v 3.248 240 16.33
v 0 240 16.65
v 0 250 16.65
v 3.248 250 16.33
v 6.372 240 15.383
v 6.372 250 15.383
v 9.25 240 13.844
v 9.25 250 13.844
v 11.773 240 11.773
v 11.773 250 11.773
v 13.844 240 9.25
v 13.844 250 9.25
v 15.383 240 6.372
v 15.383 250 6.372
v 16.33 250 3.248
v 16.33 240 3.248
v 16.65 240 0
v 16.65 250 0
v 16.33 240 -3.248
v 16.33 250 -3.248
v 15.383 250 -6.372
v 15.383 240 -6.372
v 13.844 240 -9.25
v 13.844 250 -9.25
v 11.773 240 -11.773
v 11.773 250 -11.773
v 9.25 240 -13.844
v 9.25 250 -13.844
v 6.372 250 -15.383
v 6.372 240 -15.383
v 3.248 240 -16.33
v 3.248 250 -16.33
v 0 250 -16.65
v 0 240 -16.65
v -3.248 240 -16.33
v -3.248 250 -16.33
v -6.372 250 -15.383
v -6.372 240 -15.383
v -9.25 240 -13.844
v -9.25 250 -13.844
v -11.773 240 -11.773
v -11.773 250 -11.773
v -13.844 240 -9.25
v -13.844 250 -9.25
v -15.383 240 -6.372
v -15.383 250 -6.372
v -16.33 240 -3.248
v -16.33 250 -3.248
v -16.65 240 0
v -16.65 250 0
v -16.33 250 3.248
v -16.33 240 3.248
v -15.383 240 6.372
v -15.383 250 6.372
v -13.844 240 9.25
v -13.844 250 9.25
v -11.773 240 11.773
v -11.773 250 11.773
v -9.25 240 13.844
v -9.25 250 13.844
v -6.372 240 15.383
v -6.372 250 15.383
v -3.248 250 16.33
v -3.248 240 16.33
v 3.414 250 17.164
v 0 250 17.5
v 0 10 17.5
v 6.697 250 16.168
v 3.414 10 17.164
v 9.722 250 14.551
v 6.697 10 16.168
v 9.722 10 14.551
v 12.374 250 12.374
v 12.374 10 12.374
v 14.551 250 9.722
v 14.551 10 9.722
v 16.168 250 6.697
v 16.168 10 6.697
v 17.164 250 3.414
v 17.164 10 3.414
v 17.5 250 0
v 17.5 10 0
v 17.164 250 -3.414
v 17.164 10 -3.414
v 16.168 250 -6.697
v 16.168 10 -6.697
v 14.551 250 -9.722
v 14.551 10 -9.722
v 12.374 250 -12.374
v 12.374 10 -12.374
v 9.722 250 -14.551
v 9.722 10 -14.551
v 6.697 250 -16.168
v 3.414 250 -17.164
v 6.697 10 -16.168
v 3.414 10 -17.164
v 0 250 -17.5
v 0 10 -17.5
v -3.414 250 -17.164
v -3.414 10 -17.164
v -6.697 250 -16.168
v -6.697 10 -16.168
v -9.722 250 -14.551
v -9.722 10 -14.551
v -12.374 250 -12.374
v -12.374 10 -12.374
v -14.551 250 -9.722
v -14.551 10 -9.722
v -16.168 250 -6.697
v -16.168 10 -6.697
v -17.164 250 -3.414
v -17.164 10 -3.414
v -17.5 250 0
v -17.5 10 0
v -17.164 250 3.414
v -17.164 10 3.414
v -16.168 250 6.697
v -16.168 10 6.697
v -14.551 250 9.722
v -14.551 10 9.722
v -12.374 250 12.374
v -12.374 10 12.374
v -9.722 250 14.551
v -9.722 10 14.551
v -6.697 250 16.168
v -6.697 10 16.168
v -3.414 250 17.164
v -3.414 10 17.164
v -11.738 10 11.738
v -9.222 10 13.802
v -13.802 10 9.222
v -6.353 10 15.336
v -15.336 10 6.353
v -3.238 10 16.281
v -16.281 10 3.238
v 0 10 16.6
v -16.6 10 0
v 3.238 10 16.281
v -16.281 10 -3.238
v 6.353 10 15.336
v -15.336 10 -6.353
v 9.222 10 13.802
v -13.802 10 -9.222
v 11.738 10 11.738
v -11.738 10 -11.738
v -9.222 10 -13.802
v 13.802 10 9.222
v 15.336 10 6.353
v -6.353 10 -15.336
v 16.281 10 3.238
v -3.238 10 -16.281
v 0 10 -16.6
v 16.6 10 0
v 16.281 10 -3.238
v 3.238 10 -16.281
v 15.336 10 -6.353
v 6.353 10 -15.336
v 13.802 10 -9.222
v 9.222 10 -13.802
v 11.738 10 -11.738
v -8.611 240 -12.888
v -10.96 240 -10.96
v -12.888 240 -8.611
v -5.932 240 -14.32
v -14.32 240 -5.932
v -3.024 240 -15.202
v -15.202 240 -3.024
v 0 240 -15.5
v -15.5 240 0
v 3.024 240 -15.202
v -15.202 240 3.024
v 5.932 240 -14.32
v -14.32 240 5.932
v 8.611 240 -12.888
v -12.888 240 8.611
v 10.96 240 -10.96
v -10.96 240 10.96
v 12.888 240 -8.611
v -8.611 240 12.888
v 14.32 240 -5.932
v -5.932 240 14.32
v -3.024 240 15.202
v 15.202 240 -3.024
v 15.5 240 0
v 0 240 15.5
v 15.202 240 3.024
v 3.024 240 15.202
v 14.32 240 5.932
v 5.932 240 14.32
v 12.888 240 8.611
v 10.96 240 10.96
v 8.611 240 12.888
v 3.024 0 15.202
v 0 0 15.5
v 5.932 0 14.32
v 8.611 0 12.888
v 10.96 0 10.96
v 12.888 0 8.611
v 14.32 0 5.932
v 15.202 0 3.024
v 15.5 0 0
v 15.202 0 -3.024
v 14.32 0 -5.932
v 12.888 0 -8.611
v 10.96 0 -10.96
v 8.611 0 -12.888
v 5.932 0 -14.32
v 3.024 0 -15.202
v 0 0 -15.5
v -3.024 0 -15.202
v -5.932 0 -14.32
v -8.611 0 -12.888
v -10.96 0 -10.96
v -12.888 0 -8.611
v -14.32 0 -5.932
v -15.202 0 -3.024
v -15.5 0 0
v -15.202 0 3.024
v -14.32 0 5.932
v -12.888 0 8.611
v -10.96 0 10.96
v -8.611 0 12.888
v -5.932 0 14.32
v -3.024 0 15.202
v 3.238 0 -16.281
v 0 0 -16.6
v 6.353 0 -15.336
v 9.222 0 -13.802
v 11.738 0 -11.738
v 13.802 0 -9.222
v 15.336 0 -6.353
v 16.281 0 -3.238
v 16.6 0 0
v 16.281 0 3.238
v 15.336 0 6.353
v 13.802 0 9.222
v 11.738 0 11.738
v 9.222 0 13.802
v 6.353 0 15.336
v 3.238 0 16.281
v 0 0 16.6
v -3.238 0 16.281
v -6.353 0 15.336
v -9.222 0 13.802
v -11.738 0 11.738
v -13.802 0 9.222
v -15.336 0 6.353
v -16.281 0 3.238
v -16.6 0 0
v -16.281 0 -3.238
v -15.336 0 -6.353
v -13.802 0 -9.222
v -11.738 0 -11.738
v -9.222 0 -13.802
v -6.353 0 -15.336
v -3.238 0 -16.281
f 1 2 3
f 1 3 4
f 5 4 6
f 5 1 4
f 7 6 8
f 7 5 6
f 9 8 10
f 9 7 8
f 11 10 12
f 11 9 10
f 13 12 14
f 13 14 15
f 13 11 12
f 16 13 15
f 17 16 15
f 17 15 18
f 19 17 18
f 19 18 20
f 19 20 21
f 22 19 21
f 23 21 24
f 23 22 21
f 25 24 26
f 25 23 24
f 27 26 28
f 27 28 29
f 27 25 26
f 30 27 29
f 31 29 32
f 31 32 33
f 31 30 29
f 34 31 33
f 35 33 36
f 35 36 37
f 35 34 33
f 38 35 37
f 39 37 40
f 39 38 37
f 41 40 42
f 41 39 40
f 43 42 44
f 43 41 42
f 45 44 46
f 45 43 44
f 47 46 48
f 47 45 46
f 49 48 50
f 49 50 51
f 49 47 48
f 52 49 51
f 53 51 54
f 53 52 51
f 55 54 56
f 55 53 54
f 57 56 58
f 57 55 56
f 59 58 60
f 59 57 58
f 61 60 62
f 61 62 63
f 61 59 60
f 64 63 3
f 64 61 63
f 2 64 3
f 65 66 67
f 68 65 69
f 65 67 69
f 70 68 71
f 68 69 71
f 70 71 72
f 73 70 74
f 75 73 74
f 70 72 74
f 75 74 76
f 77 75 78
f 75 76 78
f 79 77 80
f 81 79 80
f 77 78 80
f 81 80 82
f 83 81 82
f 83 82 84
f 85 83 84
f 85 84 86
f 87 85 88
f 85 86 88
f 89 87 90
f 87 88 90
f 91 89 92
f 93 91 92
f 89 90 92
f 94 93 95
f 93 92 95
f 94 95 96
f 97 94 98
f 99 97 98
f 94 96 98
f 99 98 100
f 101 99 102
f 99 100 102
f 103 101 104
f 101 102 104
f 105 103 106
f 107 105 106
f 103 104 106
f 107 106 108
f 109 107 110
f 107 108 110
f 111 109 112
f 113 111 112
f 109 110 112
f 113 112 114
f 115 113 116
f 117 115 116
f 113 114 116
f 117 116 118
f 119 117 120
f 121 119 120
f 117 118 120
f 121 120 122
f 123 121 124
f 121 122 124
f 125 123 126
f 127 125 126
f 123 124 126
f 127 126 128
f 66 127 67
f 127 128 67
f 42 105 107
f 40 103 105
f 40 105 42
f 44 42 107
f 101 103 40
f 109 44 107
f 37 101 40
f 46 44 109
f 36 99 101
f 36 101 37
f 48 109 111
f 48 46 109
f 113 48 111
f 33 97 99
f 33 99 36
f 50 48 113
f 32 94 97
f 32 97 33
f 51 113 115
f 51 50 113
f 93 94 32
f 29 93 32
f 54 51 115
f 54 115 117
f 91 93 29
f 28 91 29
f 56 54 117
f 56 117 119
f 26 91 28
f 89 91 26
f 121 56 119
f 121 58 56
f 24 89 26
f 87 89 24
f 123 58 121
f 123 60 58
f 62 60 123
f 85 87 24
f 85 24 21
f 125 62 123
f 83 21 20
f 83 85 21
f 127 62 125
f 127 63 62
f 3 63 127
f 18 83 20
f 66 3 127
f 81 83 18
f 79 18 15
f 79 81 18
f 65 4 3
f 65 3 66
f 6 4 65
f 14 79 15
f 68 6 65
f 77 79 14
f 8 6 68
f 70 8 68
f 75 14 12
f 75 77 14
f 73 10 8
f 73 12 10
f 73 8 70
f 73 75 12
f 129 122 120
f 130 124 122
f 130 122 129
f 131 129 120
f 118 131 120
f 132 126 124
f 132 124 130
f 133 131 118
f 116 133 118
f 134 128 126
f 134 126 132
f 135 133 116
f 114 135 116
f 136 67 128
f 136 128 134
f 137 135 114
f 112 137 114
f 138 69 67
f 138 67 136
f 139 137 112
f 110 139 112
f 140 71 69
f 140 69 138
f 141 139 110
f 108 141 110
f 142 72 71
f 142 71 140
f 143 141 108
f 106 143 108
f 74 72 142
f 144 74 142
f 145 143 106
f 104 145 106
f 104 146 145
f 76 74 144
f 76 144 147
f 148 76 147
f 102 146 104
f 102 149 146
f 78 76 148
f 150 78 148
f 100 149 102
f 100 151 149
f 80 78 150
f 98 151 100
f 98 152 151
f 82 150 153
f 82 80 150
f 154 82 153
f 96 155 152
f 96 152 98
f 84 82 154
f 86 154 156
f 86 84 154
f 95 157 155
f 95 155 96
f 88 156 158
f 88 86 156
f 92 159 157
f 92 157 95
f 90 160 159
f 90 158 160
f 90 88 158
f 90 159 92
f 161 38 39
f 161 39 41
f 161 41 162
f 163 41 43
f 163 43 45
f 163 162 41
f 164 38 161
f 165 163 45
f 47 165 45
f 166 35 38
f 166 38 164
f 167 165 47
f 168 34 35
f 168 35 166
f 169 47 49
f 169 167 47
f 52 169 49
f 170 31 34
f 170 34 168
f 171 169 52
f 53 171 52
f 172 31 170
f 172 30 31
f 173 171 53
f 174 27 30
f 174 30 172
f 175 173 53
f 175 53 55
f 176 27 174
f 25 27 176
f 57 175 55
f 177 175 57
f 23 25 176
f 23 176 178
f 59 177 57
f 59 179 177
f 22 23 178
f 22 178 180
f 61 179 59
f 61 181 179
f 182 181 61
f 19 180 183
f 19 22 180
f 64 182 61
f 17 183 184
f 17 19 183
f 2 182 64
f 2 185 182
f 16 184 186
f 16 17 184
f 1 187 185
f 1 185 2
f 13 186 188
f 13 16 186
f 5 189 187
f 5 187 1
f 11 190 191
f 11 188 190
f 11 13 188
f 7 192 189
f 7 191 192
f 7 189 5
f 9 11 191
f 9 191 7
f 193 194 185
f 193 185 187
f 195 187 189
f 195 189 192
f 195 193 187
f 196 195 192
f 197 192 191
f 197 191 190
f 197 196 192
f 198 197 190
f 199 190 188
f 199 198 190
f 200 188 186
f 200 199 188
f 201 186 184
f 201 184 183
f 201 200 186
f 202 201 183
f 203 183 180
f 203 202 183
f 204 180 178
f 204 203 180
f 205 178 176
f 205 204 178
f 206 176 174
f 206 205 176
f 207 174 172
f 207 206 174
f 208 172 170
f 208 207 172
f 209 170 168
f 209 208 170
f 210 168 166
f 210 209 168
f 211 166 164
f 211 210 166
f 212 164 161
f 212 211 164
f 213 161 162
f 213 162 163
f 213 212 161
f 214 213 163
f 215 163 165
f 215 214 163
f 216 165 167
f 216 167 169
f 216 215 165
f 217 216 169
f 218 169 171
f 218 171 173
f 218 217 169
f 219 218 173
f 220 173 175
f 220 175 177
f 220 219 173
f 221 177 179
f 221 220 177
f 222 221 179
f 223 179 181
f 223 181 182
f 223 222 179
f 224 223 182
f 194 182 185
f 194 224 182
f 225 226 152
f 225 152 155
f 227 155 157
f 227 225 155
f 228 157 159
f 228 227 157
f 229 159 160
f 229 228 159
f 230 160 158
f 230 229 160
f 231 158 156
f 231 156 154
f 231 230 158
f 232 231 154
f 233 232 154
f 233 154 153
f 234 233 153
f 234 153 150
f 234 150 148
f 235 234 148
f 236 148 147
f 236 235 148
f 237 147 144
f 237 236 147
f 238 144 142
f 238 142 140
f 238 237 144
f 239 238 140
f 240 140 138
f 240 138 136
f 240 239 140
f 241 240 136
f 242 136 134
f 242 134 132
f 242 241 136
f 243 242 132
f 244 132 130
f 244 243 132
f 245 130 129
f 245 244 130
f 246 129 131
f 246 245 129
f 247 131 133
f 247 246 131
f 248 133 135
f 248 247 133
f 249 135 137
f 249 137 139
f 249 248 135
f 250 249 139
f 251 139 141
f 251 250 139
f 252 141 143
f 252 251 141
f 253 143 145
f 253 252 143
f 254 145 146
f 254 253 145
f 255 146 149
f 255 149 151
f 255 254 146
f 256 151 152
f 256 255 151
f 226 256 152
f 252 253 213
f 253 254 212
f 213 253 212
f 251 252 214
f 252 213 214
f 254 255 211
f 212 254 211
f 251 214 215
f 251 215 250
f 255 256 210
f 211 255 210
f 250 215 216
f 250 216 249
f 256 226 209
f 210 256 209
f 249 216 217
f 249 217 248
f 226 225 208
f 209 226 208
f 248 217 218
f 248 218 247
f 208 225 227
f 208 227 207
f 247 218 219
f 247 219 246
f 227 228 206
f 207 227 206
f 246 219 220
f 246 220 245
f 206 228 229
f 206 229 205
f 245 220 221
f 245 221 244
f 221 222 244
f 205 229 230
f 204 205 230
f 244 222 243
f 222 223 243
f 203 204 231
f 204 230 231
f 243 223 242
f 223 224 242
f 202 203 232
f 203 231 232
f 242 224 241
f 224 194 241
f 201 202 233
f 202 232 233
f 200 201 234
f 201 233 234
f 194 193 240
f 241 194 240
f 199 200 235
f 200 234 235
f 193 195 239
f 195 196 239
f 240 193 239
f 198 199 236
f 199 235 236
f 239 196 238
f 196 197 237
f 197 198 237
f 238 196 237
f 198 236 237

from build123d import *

# Parameters (mm, degrees)
SKETCH1_R           = 17.5
SKETCH1_R_2         = 15.5
BOSS_EXTRUDE1_DEPTH = 240
SKETCH2_R           = 17.5
SKETCH2_R_2         = 16.65
BOSS_EXTRUDE2_DEPTH = 10
SKETCH3_R           = 17.5
SKETCH3_R_2         = 16.6
CUT_EXTRUDE1_DEPTH  = 10


with BuildPart() as part:
    # Sketch1 → Boss-Extrude1 (new body)
    with BuildSketch(Plane(origin=(0, 0, 0), x_dir=(1, 0, 0), z_dir=(0, 1, 0))):
        with Locations(Location((0, 0, 0), (0, 0, 270))):
            Circle(SKETCH1_R)
        with Locations(Location((0, 0, 0), (0, 0, 270))):
            Circle(SKETCH1_R_2, mode=Mode.SUBTRACT)
    extrude(amount=BOSS_EXTRUDE1_DEPTH)

    # Sketch2 → Boss-Extrude2 (add)
    with BuildSketch(Plane(origin=(0, 240, 0), x_dir=(1, 0, 0), z_dir=(0, 1, 0))):
        with Locations(Location((0, 0, 0), (0, 0, 270))):
            Circle(SKETCH2_R)
        with Locations(Location((0, 0, 0), (0, 0, 270))):
            Circle(SKETCH2_R_2, mode=Mode.SUBTRACT)
    extrude(amount=BOSS_EXTRUDE2_DEPTH)

    # Sketch3 → Cut-Extrude1 (cut)
    with BuildSketch(Plane.XZ):
        with Locations(Location((0, 0, 0), (0, 0, 270))):
            Circle(SKETCH3_R)
        with Locations(Location((0, 0, 0), (0, 0, 270))):
            Circle(SKETCH3_R_2, mode=Mode.SUBTRACT)
    extrude(amount=-CUT_EXTRUDE1_DEPTH, mode=Mode.SUBTRACT)


solid = part.part
